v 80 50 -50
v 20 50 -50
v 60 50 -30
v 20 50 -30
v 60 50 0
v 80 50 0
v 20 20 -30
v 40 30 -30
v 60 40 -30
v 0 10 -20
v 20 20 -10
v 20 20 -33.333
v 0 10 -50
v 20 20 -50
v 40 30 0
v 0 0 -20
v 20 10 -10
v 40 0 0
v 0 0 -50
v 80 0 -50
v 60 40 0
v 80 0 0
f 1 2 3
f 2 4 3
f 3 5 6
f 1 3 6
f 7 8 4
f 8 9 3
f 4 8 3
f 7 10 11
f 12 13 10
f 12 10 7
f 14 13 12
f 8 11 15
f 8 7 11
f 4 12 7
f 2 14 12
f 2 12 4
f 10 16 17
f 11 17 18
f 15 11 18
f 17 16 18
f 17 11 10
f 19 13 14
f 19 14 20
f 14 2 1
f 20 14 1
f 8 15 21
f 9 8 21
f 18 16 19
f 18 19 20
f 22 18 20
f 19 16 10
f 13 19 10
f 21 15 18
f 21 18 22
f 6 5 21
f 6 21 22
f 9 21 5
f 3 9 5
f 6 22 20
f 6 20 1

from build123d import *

# Parameters (mm, degrees)
SKETCH1_W           = 80
SKETCH1_H           = 50
BOSS_EXTRUDE1_DEPTH = 50
CUT_EXTRUDE1_DEPTH  = 30
SKETCH3_W           = 20
SKETCH3_H           = 40
CUT_EXTRUDE2_DEPTH  = 103
CUT_EXTRUDE3_DEPTH  = 103
SKETCH5_W           = 30
SKETCH5_H           = 20
CUT_EXTRUDE4_DEPTH  = 103
CUT_EXTRUDE6_DEPTH  = 103
BOSS_EXTRUDE2_DEPTH = 15
BOSS_EXTRUDE3_DEPTH = 15
SKETCH10_W          = 83.848824186
SKETCH10_H          = 50
CUT_EXTRUDE7_DEPTH  = 15
BOSS_EXTRUDE6_DEPTH = 37


with BuildPart() as part:
    # Sketch1 → Boss-Extrude1 (new body)
    with BuildSketch(Plane.XY):
        with Locations((40, 25)):
            Rectangle(SKETCH1_W, SKETCH1_H)
    extrude(amount=-BOSS_EXTRUDE1_DEPTH)

    # Sketch2 → Cut-Extrude1 (cut)
    with BuildSketch(Plane.XY):
        Polygon((60, 40), (60, 50), (40, 50), (40, 30), align=None)
    extrude(amount=-CUT_EXTRUDE1_DEPTH, mode=Mode.SUBTRACT)

    # Sketch3 → Cut-Extrude2 (cut)
    with BuildSketch(Plane(origin=(0, 0, -50), x_dir=(-1, 0, 0), z_dir=(0, 0, -1))):
        with Locations((-10, 30)):
            Rectangle(SKETCH3_W, SKETCH3_H)
    extrude(amount=-CUT_EXTRUDE2_DEPTH, mode=Mode.SUBTRACT)

    # Sketch4 → Cut-Extrude3 (cut)
    with BuildSketch(Plane(origin=(0, 0, 0), x_dir=(-1, 0, 0), z_dir=(0, -1, 0))):
        Polygon((0, 0), (0, 20), (-40, 0), align=None)
    extrude(amount=-CUT_EXTRUDE3_DEPTH, mode=Mode.SUBTRACT)

    # Sketch5 → Cut-Extrude4 (cut)
    with BuildSketch(Plane(origin=(40, 0, 0), x_dir=(0, 0, -1), z_dir=(1, 0, 0))):
        with Locations((15, 40)):
            Rectangle(SKETCH5_W, SKETCH5_H)
    extrude(amount=-CUT_EXTRUDE4_DEPTH, mode=Mode.SUBTRACT)

    # Sketch6 → Cut-Extrude6 (cut)
    with BuildSketch(Plane(origin=(-4, 8, 0), x_dir=(-0.894427191, -0.447213595, 0), z_dir=(0.447213595, -0.894427191, 0))):
        Polygon((-71.55417528, 30), (-4.472135955, 35), (0, 0), (-71.55417528, 0), align=None)
    extrude(amount=-CUT_EXTRUDE6_DEPTH, mode=Mode.SUBTRACT)

    # Sketch7 → Boss-Extrude2 (add)
    with BuildSketch(Plane(origin=(-4, 8, 0), x_dir=(-0.894427191, -0.447213595, 0), z_dir=(0.447213595, -0.894427191, 0))):
        Polygon((-26.83281573, 33.333333333), (-4.472135955, 50), (-4.472135955, 20), (-26.83281573, 10), align=None)
        Polygon((-26.83281573, 50), (-4.472135955, 50), (-26.83281573, 33.333333333), align=None)
    extrude(amount=BOSS_EXTRUDE2_DEPTH)

    # Sketch8 → Boss-Extrude3 (add)
    with BuildSketch(Plane(origin=(8, 0, -16), x_dir=(0.894427191, 0, 0.447213595), z_dir=(-0.447213595, 0, 0.894427191))):
        Polygon((13.416407865, 10), (-8.94427191, 10), (13.416407865, 20), align=None)
    extrude(amount=-BOSS_EXTRUDE3_DEPTH)

    # Sketch10 → Cut-Extrude7 (cut)
    with BuildSketch(Plane(origin=(0, 0, 0), x_dir=(-1, 0, 0), z_dir=(0, -1, 0))):
        with Locations((-38.075587907, 25)):
            Rectangle(SKETCH10_W, SKETCH10_H)
    extrude(amount=CUT_EXTRUDE7_DEPTH, mode=Mode.SUBTRACT)

    # Sketch15 → Boss-Extrude6 (add)
    with BuildSketch(Plane(origin=(0, 50, 0), x_dir=(1, 0, 0), z_dir=(0, 1, 0))):
        Polygon((55, 30), (60, 30), (62.90753881, 30), (62.90753881, 35.567139934), (20, 35.567139934), (20, 32.333333333), align=None)
        Polygon((20, 30), (55, 30), (20, 32.333333333), align=None)
    extrude(amount=-BOSS_EXTRUDE6_DEPTH)


solid = part.part
